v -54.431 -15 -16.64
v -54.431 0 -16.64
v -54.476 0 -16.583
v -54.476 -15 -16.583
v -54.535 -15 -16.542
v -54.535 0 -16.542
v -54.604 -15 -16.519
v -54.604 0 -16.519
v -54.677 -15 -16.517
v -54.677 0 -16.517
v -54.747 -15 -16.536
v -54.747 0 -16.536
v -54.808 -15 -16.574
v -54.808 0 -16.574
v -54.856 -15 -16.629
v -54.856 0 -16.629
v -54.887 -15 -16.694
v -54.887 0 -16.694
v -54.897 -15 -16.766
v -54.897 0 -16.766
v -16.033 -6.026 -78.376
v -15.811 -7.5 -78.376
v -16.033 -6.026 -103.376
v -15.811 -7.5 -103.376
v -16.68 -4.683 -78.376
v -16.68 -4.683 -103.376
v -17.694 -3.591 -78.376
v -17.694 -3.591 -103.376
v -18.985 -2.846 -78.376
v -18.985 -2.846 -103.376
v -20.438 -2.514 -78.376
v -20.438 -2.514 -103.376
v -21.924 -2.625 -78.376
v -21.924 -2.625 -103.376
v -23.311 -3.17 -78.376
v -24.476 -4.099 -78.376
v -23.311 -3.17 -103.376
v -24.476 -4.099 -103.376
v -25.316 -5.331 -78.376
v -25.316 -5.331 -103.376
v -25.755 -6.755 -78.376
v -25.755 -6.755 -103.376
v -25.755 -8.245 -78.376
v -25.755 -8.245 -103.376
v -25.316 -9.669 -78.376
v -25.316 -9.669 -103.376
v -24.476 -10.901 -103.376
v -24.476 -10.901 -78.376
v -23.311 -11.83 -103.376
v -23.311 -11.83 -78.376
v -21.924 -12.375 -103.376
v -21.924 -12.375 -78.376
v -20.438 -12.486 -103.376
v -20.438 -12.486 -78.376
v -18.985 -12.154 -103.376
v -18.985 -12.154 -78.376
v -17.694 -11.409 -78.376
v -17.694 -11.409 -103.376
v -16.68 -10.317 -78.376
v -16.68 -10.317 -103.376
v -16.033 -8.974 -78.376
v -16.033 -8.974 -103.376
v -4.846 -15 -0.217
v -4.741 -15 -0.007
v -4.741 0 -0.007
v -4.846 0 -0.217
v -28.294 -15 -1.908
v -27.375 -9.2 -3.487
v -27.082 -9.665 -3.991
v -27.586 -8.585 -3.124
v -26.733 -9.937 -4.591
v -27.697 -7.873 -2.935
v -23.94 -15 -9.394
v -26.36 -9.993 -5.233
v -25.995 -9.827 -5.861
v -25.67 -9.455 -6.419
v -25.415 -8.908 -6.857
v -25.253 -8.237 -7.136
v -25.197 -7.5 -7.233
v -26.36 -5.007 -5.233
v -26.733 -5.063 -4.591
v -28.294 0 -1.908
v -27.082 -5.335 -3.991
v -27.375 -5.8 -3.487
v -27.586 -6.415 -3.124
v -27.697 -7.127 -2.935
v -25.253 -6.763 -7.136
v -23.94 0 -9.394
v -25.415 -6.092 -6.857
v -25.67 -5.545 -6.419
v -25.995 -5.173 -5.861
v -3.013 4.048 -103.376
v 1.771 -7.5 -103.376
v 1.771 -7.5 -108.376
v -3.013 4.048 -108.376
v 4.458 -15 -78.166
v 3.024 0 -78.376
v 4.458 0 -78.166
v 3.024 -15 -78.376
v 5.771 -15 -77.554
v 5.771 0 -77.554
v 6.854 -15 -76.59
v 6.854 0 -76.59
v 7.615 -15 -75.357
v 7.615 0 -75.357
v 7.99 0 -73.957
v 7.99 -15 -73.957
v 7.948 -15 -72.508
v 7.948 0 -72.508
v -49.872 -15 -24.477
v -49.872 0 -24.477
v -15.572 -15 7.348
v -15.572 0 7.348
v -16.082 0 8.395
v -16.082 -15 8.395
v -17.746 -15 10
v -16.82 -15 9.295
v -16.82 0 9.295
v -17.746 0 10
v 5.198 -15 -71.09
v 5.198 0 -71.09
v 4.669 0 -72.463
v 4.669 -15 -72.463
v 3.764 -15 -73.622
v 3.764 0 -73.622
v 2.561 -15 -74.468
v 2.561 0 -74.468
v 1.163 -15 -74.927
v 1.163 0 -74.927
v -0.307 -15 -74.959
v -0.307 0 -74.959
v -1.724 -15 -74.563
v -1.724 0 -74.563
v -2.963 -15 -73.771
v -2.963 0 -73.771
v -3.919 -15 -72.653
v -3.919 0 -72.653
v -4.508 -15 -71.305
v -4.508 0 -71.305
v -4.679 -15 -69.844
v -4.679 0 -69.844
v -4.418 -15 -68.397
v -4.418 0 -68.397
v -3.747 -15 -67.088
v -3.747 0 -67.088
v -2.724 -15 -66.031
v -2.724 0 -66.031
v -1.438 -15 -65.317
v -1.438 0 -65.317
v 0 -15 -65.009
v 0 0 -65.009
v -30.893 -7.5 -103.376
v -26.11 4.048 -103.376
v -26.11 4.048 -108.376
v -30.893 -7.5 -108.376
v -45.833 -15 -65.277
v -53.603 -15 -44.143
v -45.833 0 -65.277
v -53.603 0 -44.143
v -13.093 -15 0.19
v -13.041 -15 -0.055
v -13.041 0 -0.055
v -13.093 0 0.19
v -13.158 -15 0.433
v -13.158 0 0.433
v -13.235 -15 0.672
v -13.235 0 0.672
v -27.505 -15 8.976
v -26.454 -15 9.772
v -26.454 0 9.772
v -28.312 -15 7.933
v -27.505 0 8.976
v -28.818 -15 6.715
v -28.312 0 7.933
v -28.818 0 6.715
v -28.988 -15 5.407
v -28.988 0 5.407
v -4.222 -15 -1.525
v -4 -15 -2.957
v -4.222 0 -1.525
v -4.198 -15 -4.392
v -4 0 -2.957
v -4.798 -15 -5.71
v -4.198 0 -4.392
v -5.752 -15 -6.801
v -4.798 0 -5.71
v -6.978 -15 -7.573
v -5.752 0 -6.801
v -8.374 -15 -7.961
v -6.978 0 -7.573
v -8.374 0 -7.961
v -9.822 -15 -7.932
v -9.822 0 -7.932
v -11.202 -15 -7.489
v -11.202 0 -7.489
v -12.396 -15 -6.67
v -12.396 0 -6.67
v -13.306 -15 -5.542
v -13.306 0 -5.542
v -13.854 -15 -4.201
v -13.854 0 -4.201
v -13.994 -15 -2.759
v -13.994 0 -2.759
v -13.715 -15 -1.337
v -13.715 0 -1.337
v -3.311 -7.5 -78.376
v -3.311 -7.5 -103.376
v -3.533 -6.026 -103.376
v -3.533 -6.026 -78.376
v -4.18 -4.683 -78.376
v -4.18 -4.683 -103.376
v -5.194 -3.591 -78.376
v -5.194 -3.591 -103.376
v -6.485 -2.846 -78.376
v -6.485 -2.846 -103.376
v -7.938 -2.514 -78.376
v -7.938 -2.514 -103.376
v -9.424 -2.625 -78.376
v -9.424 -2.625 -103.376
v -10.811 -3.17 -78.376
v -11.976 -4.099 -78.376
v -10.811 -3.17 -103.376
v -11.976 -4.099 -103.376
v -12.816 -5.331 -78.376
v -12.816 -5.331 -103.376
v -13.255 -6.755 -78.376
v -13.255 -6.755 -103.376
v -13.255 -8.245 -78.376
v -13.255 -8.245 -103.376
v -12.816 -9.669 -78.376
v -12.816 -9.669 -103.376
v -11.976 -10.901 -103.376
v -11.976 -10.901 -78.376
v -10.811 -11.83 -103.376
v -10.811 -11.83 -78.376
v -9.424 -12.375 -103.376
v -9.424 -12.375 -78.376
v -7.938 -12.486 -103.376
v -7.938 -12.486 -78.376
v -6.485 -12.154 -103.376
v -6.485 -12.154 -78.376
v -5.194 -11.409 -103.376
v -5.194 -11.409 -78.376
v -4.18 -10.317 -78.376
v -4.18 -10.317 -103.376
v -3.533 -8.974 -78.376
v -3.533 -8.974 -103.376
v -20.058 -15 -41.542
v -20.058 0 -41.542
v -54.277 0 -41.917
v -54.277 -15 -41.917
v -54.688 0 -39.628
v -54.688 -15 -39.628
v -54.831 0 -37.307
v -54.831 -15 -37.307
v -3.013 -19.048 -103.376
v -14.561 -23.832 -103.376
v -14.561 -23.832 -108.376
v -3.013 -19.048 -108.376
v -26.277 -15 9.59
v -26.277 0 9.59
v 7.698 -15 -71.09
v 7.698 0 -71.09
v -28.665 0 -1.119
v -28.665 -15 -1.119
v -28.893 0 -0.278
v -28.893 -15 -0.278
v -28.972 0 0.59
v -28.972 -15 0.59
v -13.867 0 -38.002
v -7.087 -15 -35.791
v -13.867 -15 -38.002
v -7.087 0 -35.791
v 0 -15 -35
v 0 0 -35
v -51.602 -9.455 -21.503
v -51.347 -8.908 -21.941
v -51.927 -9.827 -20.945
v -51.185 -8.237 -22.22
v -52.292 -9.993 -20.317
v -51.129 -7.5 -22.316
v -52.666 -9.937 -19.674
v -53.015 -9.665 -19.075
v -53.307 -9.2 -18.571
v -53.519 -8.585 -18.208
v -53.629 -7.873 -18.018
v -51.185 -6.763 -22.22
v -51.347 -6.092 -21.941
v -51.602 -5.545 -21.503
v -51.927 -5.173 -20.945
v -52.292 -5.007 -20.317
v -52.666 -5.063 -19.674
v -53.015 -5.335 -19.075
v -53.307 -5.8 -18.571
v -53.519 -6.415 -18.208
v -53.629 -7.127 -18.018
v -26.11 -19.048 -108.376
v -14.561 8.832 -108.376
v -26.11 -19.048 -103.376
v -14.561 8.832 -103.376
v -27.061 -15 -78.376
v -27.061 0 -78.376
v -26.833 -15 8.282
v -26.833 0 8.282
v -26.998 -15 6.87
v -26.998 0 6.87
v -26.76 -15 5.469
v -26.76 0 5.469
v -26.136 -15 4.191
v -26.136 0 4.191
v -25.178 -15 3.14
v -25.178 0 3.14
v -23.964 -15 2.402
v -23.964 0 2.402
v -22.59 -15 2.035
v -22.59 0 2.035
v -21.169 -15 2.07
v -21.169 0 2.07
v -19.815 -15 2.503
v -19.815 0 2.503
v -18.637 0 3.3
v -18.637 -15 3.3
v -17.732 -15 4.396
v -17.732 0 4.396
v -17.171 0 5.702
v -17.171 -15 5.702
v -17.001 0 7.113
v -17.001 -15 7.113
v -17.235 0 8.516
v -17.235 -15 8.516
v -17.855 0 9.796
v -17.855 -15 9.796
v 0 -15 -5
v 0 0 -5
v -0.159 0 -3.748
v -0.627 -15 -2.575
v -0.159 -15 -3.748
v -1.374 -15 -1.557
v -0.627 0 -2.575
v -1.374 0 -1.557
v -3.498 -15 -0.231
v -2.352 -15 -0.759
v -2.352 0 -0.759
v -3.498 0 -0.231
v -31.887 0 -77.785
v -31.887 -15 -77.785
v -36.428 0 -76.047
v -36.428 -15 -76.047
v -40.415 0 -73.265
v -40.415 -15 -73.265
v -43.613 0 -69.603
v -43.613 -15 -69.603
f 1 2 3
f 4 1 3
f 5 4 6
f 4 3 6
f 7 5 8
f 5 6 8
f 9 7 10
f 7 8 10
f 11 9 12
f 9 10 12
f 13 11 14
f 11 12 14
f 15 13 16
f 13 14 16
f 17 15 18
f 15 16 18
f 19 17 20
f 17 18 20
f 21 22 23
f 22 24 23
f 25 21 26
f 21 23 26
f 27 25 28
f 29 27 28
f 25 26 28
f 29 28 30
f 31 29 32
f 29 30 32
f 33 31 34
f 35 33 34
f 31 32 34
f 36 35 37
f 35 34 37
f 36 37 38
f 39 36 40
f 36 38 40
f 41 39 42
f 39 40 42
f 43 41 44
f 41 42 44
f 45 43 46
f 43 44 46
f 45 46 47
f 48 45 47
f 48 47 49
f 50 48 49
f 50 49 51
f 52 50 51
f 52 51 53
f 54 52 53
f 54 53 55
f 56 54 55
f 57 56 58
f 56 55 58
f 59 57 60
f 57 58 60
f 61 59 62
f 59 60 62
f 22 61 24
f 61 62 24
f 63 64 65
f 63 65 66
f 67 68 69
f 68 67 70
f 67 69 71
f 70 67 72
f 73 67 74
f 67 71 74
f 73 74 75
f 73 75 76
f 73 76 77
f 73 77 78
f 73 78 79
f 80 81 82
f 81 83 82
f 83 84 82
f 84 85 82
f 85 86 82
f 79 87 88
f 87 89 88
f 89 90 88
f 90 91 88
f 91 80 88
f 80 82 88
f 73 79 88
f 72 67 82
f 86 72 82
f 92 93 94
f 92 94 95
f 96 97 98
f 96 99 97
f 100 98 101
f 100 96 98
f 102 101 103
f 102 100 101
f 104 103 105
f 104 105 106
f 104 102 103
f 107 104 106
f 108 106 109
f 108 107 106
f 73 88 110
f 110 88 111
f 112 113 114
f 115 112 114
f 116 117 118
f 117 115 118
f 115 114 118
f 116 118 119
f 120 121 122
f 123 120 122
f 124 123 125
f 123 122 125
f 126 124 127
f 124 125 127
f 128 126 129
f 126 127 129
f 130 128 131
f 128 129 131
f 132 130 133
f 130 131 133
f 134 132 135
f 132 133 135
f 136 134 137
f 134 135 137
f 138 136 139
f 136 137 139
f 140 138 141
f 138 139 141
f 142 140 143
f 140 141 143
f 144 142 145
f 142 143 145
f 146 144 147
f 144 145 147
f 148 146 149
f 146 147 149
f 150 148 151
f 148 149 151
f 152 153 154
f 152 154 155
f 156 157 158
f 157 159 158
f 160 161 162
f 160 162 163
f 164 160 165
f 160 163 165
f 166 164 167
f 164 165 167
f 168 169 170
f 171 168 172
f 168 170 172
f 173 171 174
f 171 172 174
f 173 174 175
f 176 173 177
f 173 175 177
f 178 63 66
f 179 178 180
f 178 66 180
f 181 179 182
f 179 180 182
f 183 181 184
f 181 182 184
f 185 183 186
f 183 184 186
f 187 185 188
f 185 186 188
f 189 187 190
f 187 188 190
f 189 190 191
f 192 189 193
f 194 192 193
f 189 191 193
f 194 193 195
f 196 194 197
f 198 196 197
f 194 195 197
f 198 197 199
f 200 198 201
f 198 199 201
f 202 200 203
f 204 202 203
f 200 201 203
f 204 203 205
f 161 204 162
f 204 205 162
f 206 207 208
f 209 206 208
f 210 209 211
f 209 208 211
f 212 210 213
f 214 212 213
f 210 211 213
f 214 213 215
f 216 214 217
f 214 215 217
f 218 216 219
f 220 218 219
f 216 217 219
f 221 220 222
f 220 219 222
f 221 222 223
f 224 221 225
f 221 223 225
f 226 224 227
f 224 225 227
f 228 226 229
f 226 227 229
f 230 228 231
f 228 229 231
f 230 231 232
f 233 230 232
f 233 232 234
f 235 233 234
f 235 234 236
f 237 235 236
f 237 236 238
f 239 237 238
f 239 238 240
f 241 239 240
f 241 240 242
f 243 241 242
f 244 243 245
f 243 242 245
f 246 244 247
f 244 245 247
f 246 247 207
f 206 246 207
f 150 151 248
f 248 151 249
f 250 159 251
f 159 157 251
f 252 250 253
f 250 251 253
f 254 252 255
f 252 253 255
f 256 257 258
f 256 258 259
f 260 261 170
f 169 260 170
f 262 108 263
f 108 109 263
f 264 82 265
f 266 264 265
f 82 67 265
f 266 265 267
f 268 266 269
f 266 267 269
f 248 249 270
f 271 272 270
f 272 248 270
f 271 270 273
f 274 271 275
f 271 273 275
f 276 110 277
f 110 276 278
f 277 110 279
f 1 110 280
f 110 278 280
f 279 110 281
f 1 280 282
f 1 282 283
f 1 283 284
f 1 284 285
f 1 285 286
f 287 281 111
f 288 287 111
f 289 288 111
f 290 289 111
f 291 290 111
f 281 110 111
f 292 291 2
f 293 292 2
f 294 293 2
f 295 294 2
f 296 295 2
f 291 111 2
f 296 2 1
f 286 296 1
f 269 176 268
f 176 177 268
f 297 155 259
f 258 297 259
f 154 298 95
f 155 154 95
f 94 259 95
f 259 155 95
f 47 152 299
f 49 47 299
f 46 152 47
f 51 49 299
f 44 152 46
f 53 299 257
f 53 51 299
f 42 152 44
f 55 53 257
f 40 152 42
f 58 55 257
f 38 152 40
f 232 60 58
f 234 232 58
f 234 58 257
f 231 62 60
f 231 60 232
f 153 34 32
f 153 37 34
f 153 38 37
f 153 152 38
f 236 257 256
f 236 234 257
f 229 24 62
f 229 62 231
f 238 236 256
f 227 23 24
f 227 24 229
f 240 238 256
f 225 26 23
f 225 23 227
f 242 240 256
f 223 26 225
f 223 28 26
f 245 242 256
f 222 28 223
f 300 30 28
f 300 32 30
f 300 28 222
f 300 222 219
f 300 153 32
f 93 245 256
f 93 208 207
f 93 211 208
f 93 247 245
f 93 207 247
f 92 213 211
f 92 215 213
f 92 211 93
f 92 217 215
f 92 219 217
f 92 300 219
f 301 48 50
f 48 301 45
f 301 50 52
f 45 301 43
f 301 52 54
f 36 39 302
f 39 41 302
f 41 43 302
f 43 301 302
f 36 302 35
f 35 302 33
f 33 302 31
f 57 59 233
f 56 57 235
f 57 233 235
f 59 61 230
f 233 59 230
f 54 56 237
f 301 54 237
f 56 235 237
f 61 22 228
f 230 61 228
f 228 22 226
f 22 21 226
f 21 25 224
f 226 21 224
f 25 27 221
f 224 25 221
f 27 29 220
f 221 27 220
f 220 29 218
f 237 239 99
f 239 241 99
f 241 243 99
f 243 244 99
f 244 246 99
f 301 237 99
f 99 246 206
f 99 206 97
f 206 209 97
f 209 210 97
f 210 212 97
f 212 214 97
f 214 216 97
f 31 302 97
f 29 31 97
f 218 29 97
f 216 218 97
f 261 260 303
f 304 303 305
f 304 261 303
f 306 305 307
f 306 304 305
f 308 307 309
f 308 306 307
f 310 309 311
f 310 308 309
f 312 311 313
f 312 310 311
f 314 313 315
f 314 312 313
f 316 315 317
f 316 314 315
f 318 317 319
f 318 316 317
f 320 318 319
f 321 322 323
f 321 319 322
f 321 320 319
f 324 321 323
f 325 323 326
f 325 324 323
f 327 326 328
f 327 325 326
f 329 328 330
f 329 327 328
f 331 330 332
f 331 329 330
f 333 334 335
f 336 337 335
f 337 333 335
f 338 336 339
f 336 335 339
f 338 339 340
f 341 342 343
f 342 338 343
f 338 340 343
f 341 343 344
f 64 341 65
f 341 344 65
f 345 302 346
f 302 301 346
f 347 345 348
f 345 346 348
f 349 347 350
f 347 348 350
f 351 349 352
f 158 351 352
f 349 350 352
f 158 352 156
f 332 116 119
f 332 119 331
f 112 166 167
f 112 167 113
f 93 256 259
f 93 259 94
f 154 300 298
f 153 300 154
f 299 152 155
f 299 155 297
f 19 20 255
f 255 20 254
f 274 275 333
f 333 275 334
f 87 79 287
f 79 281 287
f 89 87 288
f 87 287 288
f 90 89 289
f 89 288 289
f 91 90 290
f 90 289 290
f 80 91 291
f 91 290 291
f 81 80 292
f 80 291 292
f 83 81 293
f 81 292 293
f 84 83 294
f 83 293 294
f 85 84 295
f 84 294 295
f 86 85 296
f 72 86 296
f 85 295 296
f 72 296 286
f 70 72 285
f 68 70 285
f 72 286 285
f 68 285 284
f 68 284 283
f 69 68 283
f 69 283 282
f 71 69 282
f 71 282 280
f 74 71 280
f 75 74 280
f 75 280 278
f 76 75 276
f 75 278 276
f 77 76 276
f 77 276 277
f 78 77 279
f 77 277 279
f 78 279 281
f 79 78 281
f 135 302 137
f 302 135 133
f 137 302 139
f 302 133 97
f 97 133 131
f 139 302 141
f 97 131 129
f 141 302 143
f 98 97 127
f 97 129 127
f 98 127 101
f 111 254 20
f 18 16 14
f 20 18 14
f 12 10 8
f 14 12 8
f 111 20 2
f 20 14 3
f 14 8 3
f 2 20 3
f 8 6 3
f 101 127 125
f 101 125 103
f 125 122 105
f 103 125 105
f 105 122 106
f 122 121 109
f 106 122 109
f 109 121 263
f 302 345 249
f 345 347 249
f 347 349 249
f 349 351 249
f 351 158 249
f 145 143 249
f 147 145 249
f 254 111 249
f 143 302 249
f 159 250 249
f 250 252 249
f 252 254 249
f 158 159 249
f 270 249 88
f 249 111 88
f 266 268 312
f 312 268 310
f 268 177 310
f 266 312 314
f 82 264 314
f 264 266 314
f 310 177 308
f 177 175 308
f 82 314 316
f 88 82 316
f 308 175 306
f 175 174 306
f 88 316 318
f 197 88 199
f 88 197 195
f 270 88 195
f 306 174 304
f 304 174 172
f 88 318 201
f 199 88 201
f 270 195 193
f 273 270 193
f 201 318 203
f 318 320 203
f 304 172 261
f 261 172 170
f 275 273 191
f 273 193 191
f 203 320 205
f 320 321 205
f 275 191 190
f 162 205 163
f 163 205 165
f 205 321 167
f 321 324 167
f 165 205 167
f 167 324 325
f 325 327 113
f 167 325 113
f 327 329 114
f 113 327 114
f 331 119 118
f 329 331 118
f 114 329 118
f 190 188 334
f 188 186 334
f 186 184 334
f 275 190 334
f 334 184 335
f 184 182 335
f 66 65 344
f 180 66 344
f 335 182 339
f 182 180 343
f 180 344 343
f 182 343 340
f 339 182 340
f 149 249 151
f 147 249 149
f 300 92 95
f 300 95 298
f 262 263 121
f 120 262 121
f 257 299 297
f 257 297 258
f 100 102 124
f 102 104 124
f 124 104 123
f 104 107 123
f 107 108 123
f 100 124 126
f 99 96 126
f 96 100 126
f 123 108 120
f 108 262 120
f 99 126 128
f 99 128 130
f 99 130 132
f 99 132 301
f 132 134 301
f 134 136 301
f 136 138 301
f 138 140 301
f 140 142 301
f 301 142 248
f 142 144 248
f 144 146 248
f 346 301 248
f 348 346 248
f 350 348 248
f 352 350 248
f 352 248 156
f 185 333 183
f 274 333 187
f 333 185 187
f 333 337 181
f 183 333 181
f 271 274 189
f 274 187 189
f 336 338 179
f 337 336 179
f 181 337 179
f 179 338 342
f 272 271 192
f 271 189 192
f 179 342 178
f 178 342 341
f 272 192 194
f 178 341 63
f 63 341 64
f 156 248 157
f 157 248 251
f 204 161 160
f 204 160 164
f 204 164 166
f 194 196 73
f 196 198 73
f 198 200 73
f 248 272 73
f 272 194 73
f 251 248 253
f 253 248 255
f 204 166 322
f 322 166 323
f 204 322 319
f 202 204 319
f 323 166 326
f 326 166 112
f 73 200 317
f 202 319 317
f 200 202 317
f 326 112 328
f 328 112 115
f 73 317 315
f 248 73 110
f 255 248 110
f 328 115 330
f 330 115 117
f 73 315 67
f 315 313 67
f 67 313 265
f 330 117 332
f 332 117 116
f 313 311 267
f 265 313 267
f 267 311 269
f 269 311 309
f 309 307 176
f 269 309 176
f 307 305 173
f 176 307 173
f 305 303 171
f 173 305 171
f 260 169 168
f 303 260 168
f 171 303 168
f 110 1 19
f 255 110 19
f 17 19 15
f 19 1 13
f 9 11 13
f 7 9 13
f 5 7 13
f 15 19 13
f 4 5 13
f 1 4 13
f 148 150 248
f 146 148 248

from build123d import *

# Parameters (mm, degrees)
SKETCH1_W                      = 5
SKETCH1_H                      = 25
BOSS_EXTRUDE1_DEPTH            = 10
BOSS_EXTRUDE2_DEPTH            = 2.5
BOSS_EXTRUDE3_START            = 2.5
BOSS_EXTRUDE3_DEPTH            = 2.5
BOSS_EXTRUDE4_DEPTH            = 5
DRAFT1_ANGLE                   = 60
DRAFT2_ANGLE                   = -10
SKETCH6_W                      = 5
SKETCH6_H                      = 15
SKETCH7_W                      = 5
SKETCH7_H                      = 15
SKETCH8_W                      = 5
SKETCH8_H                      = 25
F_10_0_10_DIAMETER_HOLE1_D     = 10
F_10_0_10_DIAMETER_HOLE1_DEPTH = 23.832037061
FILLET1_R                      = 5
FILLET2_R                      = 20


with BuildPart() as part:
    # Sketch1 → Revolve1 (revolve)
    with BuildSketch(Plane(origin=(0, -7.5, 0), x_dir=(1, 0, 0), z_dir=(0, 1, 0))):
        with Locations((-5.811233855, 90.876419512)):
            Rectangle(SKETCH1_W, SKETCH1_H)
    revolve(axis=Axis((-8.311233855, -7.5, -103.376419512), (0, 0, 1)))

    # Sketch2 → Boss-Extrude1 (add)
    with BuildSketch(Plane(origin=(0, -2.5, 0), x_dir=(1, 0, 0), z_dir=(0, 1, 0))):
        with BuildLine():
            Line((-20.904218066, -4.060593221), (-17.745761276, -10))
            ThreePointArc((-17.745761276, -10), (-16.42436709, -8.86625844), (-15.571850751, -7.348145002))
            Line((-15.571850751, -7.348145002), (-13.235172111, -0.671920317))
            ThreePointArc((-13.235172111, -0.671920317), (-13.124251068, -0.312083076), (-13.040724348, 0.055081199))
            ThreePointArc((-13.040724348, 0.055081199), (-9.034250588, -1.999882688), (-5, 0))
            ThreePointArc((-5, 0), (-1.464466094, 1.464466094), (0, 5))
            Line((0, 5), (0, 35))
            ThreePointArc((0, 35), (-10.533604853, 36.723434751), (-20.057952451, 41.541511272))
            Line((-20.057952451, 41.541511272), (5.197843412, 71.090018979))
            Line((5.197843412, 71.090018979), (8.982632418, 71.090018979))
            Line((8.982632418, 71.090018979), (8.982632418, 78.376419512))
            Line((8.982632418, 78.376419512), (-8.311233855, 78.376419512))
            Line((-8.311233855, 78.376419512), (-41.017367582, 78.376419512))
            Line((-41.017367582, 78.376419512), (-54.819345863, 40.83303933))
            Line((-54.819345863, 40.83303933), (-54.896976862, 16.766177236))
            ThreePointArc((-54.896976862, 16.766177236), (-54.712461515, 16.524099343), (-54.430876141, 16.639673113))
            Line((-54.430876141, 16.639673113), (-49.872077715, 24.477250263))
            Line((-49.872077715, 24.477250263), (-8.967847829, 0.684930874))
            Line((-8.967847829, 0.684930874), (-28.967743782, 0.74944331))
            Line((-28.967743782, 0.74944331), (-28.987601327, -5.406715976))
            ThreePointArc((-28.987601327, -5.406715976), (-28.311946244, -7.932877153), (-26.453503439, -9.772494077))
            Line((-26.453503439, -9.772494077), (-20.904218066, -4.060593221))
        make_face()
    extrude(amount=-BOSS_EXTRUDE1_DEPTH)

    # Sketch3 → Boss-Extrude2 (add)
    with BuildSketch(Plane.XZ.offset(12.5)):
        with BuildLine():
            Line((-20.904218066, 4.060593221), (-17.745761276, 10))
            ThreePointArc((-17.745761276, 10), (-16.42436709, 8.86625844), (-15.571850751, 7.348145002))
            Line((-15.571850751, 7.348145002), (-13.235172111, 0.671920317))
            ThreePointArc((-13.235172111, 0.671920317), (-13.124251068, 0.312083076), (-13.040724348, -0.055081199))
            ThreePointArc((-13.040724348, -0.055081199), (-9.034250588, 1.999882688), (-5, 0))
            ThreePointArc((-5, 0), (-1.464466094, -1.464466094), (0, -5))
            Line((0, -5), (0, -35))
            ThreePointArc((0, -35), (-10.533604853, -36.723434751), (-20.057952451, -41.541511272))
            Line((-20.057952451, -41.541511272), (5.197843412, -71.090018979))
            Line((5.197843412, -71.090018979), (8.982632418, -71.090018979))
            Line((8.982632418, -71.090018979), (8.982632418, -78.376419512))
            Line((8.982632418, -78.376419512), (-41.017367582, -78.376419512))
            Line((-41.017367582, -78.376419512), (-54.819345863, -40.83303933))
            Line((-54.819345863, -40.83303933), (-54.896976862, -16.766177236))
            ThreePointArc((-54.896976862, -16.766177236), (-54.712461515, -16.524099343), (-54.430876141, -16.639673113))
            Line((-54.430876141, -16.639673113), (-49.872077715, -24.477250263))
            Line((-49.872077715, -24.477250263), (-8.967847829, -0.684930874))
            Line((-8.967847829, -0.684930874), (-28.967743782, -0.74944331))
            Line((-28.967743782, -0.74944331), (-28.987601327, 5.406715976))
            ThreePointArc((-28.987601327, 5.406715976), (-28.311946244, 7.932877153), (-26.453503439, 9.772494077))
            Line((-26.453503439, 9.772494077), (-20.904218066, 4.060593221))
        make_face()
    extrude(amount=BOSS_EXTRUDE2_DEPTH)

    # Sketch4 → Boss-Extrude3 (add)
    with BuildSketch(Plane(origin=(0, -2.5, 0), x_dir=(-1, 0, 0), z_dir=(0, 1, 0)).offset(BOSS_EXTRUDE3_START)):
        with BuildLine():
            Line((20.904218066, 4.060593221), (26.453503439, 9.772494077))
            ThreePointArc((26.453503439, 9.772494077), (28.311946244, 7.932877153), (28.987601327, 5.406715976))
            Line((28.987601327, 5.406715976), (28.967743782, -0.74944331))
            Line((28.967743782, -0.74944331), (8.967847829, -0.684930874))
            Line((8.967847829, -0.684930874), (49.872077715, -24.477250263))
            Line((49.872077715, -24.477250263), (54.430876141, -16.639673113))
            ThreePointArc((54.430876141, -16.639673113), (54.712461515, -16.524099343), (54.896976862, -16.766177236))
            Line((54.896976862, -16.766177236), (54.819345863, -40.83303933))
            Line((54.819345863, -40.83303933), (41.017367582, -78.376419512))
            Line((41.017367582, -78.376419512), (-8.982632418, -78.376419512))
            Line((-8.982632418, -78.376419512), (-8.982632418, -71.090018979))
            Line((-8.982632418, -71.090018979), (-5.197843412, -71.090018979))
            Line((-5.197843412, -71.090018979), (20.057952451, -41.541511272))
            ThreePointArc((20.057952451, -41.541511272), (10.533604853, -36.723434751), (0, -35))
            Line((0, -35), (0, -5))
            ThreePointArc((0, -5), (1.464466094, -1.464466094), (5, 0))
            ThreePointArc((5, 0), (9.034250588, 1.999882688), (13.040724348, -0.055081199))
            ThreePointArc((13.040724348, -0.055081199), (13.124251068, 0.312083076), (13.235172111, 0.671920317))
            Line((13.235172111, 0.671920317), (15.571850751, 7.348145002))
            ThreePointArc((15.571850751, 7.348145002), (16.42436709, 8.86625844), (17.745761276, 10))
            Line((17.745761276, 10), (20.904218066, 4.060593221))
        make_face()
    extrude(amount=-BOSS_EXTRUDE3_DEPTH)

    # Sketch5 → Boss-Extrude4 (add)
    with BuildSketch(Plane.XY.offset(-103.376419512)):
        Polygon((-3.012739699, 4.048494156), (-14.561233855, 8.832037061), (-26.109728012, 4.048494156), (-30.893270916, -7.5), (-26.109728012, -19.048494156), (-14.561233855, -23.832037061), (-3.012739699, -19.048494156), (1.770803206, -7.5), align=None)
    extrude(amount=-BOSS_EXTRUDE4_DEPTH)

    # Draft1
    draft1_faces = [part.faces().sort_by_distance(p)[0] for p in [
        (-18.967795805, -7.5, -0.717187092),
    ]]
    draft(draft1_faces, Plane(origin=(-28.967743782, -12.5, -0.74944331), x_dir=(0.0032256218002524395, 0, -0.9999947976684688), z_dir=(-0.9999947976684688, 0, -0.0032256218002524395)), DRAFT1_ANGLE)

    # Draft2
    draft2_faces = [part.faces().sort_by_distance(p)[0] for p in [
        (8.982632418, -7.5, -74.733219246),
    ]]
    draft(draft2_faces, Plane(origin=(-8.311233855, -12.5, -78.376419512), x_dir=(-1, 0, 0), z_dir=(0, 0, -1)), DRAFT2_ANGLE)

    # Sketch6 → Cut-Revolve1 (revolve, cut)
    with BuildSketch(Plane.XY.offset(7)):
        with Locations((-19.5, -7.5)):
            Rectangle(SKETCH6_W, SKETCH6_H)
    revolve(axis=Axis((-22, 0, 7), (0, -1, 0)), mode=Mode.SUBTRACT)

    # Sketch7 → Cut-Revolve2 (revolve, cut)
    with BuildSketch(Plane(origin=(0, 0, -3), x_dir=(-1, 0, 0), z_dir=(0, 0, -1))):
        with Locations((6.5, -7.5)):
            Rectangle(SKETCH7_W, SKETCH7_H)
    revolve(axis=Axis((-9, -15, -3), (0, 1, 0)), mode=Mode.SUBTRACT)

    # Sketch8 → Revolve2 (revolve)
    with BuildSketch(Plane(origin=(0, -7.5, 0), x_dir=(1, 0, 0), z_dir=(0, 1, 0))):
        with Locations((-18.311233855, 90.876419512)):
            Rectangle(SKETCH8_W, SKETCH8_H)
    revolve(axis=Axis((-20.811233855, -7.5, -103.376419512), (0, 0, 1)))

    # Sketch9 → Revolve3 (revolve)
    with BuildSketch(Plane(origin=(0, -7.5, 0), x_dir=(1, 0, 0), z_dir=(0, 1, 0))):
        Polygon((-51.129054889, 22.316230044), (-52.386032062, 20.155209826), (-26.453789436, 5.071483748), (-25.196812263, 7.232503967), align=None)
    revolve(axis=Axis((-53.325247092, -7.5, -20.701512837), (0.8644080875330462, 0, 0.502790869256256)))

    # Ø10.0 (10) Diameter Hole1
    with Locations(Plane(origin=(0, -15, 0), x_dir=(-1, 0, 0), z_dir=(0, -1, 0))):
        with Locations((-0.318427602, 69.998551454)):
            Hole(F_10_0_10_DIAMETER_HOLE1_D / 2, depth=F_10_0_10_DIAMETER_HOLE1_DEPTH)

    # Chamfer1
    # the kernel refuses this chamfer: 0.262951912, 0.262770817 mm, written as the material it takes off along each edge
    with BuildSketch(Plane(origin=(-5, -15.679311202, 0), x_dir=(0.9996632496701223, 4.862291359988254e-15, -0.02594970633688609), z_dir=(0, 1, 0))) as chamfer1_piece_1:
        with BuildLine():
            Line((0.259497063, 0), (0.159812325, 0.213399124))
            ThreePointArc((0.159812325, 0.213399124), (0.082816569, 0.107621918), (0, 0))
            ThreePointArc((0, 0), (0.131972937, -0.001683257), (0.259497063, 0))
        make_face()
    extrude(amount=16.358622404, mode=Mode.SUBTRACT)

    # Fillet1
    fillet1_edges = [part.edges().sort_by_distance(p)[0] for p in [
        (-28.967743782, -7.5, -0.74944331),
        (8.982632418, -7.5, -78.376419512),
    ]]
    fillet(fillet1_edges, radius=FILLET1_R)

    # Fillet2
    fillet2_edges = [part.edges().sort_by_distance(p)[0] for p in [
        (-41.017367582, -7.5, -78.376419512),
        (-54.819345863, -7.5, -40.83303933),
    ]]
    fillet(fillet2_edges, radius=FILLET2_R)


solid = part.part
